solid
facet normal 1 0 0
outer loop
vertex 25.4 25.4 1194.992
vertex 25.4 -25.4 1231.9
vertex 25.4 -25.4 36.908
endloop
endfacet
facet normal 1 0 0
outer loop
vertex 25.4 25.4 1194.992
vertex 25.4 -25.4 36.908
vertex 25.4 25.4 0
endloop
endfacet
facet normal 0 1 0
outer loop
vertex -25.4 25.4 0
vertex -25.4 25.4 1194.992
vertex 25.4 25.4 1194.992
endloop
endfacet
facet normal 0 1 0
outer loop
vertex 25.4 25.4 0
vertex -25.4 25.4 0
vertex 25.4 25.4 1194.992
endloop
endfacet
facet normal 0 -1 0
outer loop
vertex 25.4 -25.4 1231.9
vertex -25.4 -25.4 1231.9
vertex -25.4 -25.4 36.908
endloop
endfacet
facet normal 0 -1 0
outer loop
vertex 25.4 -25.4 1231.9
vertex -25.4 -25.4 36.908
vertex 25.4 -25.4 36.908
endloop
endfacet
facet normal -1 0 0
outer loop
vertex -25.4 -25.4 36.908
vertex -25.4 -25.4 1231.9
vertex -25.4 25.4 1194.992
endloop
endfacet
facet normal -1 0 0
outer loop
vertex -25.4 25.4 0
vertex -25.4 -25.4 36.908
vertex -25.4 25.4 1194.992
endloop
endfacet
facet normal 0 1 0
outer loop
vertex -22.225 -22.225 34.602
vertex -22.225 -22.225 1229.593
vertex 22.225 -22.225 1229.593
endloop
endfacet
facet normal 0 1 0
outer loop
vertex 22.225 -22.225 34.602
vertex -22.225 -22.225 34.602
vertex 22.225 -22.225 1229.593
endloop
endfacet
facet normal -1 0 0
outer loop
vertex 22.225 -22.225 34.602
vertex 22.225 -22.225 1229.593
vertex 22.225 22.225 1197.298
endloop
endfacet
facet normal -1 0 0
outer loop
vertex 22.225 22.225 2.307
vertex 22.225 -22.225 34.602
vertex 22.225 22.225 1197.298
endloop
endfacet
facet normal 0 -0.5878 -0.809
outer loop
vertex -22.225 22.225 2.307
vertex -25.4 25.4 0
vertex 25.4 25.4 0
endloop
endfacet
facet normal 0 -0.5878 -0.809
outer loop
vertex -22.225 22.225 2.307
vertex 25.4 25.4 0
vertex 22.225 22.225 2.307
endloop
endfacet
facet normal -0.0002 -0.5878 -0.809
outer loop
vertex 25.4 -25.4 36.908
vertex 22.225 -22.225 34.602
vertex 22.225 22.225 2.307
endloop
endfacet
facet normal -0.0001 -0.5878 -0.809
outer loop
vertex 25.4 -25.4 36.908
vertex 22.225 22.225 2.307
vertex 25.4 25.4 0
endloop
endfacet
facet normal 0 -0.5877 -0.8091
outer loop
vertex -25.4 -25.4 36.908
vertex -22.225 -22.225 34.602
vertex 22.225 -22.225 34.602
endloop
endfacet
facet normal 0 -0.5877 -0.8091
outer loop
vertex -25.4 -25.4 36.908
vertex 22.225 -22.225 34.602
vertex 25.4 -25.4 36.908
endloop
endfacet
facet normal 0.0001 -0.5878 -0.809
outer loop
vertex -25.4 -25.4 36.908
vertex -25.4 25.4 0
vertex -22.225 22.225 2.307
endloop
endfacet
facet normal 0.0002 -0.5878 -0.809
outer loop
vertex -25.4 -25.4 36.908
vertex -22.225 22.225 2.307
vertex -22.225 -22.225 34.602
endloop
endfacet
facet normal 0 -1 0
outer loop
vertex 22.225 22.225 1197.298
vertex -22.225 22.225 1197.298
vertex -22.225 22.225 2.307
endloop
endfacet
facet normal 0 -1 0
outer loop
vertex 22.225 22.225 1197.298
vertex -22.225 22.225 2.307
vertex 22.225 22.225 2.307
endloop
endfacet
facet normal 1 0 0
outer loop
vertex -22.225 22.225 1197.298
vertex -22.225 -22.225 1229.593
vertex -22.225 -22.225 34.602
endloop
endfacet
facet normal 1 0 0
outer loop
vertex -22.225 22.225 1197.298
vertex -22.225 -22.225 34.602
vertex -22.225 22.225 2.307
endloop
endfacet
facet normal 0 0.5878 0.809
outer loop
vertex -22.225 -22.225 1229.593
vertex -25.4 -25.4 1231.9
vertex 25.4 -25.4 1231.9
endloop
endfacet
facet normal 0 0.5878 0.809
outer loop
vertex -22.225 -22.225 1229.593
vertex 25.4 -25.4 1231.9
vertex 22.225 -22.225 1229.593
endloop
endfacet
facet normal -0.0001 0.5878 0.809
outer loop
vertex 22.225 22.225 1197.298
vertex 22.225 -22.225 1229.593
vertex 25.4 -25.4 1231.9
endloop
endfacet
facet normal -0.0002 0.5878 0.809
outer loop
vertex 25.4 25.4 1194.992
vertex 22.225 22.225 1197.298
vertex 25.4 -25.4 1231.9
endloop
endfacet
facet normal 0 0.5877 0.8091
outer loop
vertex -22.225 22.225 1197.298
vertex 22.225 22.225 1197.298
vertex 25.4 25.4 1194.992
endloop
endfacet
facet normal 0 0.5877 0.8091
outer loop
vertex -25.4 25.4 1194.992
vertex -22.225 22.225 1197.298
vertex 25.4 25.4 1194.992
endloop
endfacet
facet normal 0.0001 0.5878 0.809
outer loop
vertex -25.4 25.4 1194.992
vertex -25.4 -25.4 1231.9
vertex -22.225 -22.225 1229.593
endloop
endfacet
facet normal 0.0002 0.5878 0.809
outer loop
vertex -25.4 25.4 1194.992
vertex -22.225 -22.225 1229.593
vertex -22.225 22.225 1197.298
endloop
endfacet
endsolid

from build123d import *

# Parameters (mm, degrees)
SKETCH1_W           = 50.8
SKETCH1_H           = 50.8
SKETCH1_W_2         = 44.45
SKETCH1_H_2         = 44.45
BOSS_EXTRUDE1_DEPTH = 1231.9
CUT_EXTRUDE1_DEPTH  = 1234.20858333
CUT_EXTRUDE2_DEPTH  = 1234.20858333


with BuildPart() as part:
    # Sketch1 → Boss-Extrude1 (new body)
    with BuildSketch(Plane.XY):
        Rectangle(SKETCH1_W, SKETCH1_H)
        Rectangle(SKETCH1_W_2, SKETCH1_H_2, mode=Mode.SUBTRACT)
    extrude(amount=BOSS_EXTRUDE1_DEPTH)

    # Sketch2 → Cut-Extrude1 (cut, through all)
    with BuildSketch(Plane.ZY.offset(25.4)):
        Polygon((0, 25.4), (36.908360423, -25.4), (0, -25.4), align=None)
    extrude(amount=-CUT_EXTRUDE1_DEPTH, mode=Mode.SUBTRACT)

    # Sketch3 → Cut-Extrude2 (cut, through all)
    with BuildSketch(Plane.ZY.offset(25.4)):
        Polygon((1231.9, -25.4), (1194.991639577, 25.4), (1231.9, 25.4), align=None)
    extrude(amount=-CUT_EXTRUDE2_DEPTH, mode=Mode.SUBTRACT)


solid = part.part
